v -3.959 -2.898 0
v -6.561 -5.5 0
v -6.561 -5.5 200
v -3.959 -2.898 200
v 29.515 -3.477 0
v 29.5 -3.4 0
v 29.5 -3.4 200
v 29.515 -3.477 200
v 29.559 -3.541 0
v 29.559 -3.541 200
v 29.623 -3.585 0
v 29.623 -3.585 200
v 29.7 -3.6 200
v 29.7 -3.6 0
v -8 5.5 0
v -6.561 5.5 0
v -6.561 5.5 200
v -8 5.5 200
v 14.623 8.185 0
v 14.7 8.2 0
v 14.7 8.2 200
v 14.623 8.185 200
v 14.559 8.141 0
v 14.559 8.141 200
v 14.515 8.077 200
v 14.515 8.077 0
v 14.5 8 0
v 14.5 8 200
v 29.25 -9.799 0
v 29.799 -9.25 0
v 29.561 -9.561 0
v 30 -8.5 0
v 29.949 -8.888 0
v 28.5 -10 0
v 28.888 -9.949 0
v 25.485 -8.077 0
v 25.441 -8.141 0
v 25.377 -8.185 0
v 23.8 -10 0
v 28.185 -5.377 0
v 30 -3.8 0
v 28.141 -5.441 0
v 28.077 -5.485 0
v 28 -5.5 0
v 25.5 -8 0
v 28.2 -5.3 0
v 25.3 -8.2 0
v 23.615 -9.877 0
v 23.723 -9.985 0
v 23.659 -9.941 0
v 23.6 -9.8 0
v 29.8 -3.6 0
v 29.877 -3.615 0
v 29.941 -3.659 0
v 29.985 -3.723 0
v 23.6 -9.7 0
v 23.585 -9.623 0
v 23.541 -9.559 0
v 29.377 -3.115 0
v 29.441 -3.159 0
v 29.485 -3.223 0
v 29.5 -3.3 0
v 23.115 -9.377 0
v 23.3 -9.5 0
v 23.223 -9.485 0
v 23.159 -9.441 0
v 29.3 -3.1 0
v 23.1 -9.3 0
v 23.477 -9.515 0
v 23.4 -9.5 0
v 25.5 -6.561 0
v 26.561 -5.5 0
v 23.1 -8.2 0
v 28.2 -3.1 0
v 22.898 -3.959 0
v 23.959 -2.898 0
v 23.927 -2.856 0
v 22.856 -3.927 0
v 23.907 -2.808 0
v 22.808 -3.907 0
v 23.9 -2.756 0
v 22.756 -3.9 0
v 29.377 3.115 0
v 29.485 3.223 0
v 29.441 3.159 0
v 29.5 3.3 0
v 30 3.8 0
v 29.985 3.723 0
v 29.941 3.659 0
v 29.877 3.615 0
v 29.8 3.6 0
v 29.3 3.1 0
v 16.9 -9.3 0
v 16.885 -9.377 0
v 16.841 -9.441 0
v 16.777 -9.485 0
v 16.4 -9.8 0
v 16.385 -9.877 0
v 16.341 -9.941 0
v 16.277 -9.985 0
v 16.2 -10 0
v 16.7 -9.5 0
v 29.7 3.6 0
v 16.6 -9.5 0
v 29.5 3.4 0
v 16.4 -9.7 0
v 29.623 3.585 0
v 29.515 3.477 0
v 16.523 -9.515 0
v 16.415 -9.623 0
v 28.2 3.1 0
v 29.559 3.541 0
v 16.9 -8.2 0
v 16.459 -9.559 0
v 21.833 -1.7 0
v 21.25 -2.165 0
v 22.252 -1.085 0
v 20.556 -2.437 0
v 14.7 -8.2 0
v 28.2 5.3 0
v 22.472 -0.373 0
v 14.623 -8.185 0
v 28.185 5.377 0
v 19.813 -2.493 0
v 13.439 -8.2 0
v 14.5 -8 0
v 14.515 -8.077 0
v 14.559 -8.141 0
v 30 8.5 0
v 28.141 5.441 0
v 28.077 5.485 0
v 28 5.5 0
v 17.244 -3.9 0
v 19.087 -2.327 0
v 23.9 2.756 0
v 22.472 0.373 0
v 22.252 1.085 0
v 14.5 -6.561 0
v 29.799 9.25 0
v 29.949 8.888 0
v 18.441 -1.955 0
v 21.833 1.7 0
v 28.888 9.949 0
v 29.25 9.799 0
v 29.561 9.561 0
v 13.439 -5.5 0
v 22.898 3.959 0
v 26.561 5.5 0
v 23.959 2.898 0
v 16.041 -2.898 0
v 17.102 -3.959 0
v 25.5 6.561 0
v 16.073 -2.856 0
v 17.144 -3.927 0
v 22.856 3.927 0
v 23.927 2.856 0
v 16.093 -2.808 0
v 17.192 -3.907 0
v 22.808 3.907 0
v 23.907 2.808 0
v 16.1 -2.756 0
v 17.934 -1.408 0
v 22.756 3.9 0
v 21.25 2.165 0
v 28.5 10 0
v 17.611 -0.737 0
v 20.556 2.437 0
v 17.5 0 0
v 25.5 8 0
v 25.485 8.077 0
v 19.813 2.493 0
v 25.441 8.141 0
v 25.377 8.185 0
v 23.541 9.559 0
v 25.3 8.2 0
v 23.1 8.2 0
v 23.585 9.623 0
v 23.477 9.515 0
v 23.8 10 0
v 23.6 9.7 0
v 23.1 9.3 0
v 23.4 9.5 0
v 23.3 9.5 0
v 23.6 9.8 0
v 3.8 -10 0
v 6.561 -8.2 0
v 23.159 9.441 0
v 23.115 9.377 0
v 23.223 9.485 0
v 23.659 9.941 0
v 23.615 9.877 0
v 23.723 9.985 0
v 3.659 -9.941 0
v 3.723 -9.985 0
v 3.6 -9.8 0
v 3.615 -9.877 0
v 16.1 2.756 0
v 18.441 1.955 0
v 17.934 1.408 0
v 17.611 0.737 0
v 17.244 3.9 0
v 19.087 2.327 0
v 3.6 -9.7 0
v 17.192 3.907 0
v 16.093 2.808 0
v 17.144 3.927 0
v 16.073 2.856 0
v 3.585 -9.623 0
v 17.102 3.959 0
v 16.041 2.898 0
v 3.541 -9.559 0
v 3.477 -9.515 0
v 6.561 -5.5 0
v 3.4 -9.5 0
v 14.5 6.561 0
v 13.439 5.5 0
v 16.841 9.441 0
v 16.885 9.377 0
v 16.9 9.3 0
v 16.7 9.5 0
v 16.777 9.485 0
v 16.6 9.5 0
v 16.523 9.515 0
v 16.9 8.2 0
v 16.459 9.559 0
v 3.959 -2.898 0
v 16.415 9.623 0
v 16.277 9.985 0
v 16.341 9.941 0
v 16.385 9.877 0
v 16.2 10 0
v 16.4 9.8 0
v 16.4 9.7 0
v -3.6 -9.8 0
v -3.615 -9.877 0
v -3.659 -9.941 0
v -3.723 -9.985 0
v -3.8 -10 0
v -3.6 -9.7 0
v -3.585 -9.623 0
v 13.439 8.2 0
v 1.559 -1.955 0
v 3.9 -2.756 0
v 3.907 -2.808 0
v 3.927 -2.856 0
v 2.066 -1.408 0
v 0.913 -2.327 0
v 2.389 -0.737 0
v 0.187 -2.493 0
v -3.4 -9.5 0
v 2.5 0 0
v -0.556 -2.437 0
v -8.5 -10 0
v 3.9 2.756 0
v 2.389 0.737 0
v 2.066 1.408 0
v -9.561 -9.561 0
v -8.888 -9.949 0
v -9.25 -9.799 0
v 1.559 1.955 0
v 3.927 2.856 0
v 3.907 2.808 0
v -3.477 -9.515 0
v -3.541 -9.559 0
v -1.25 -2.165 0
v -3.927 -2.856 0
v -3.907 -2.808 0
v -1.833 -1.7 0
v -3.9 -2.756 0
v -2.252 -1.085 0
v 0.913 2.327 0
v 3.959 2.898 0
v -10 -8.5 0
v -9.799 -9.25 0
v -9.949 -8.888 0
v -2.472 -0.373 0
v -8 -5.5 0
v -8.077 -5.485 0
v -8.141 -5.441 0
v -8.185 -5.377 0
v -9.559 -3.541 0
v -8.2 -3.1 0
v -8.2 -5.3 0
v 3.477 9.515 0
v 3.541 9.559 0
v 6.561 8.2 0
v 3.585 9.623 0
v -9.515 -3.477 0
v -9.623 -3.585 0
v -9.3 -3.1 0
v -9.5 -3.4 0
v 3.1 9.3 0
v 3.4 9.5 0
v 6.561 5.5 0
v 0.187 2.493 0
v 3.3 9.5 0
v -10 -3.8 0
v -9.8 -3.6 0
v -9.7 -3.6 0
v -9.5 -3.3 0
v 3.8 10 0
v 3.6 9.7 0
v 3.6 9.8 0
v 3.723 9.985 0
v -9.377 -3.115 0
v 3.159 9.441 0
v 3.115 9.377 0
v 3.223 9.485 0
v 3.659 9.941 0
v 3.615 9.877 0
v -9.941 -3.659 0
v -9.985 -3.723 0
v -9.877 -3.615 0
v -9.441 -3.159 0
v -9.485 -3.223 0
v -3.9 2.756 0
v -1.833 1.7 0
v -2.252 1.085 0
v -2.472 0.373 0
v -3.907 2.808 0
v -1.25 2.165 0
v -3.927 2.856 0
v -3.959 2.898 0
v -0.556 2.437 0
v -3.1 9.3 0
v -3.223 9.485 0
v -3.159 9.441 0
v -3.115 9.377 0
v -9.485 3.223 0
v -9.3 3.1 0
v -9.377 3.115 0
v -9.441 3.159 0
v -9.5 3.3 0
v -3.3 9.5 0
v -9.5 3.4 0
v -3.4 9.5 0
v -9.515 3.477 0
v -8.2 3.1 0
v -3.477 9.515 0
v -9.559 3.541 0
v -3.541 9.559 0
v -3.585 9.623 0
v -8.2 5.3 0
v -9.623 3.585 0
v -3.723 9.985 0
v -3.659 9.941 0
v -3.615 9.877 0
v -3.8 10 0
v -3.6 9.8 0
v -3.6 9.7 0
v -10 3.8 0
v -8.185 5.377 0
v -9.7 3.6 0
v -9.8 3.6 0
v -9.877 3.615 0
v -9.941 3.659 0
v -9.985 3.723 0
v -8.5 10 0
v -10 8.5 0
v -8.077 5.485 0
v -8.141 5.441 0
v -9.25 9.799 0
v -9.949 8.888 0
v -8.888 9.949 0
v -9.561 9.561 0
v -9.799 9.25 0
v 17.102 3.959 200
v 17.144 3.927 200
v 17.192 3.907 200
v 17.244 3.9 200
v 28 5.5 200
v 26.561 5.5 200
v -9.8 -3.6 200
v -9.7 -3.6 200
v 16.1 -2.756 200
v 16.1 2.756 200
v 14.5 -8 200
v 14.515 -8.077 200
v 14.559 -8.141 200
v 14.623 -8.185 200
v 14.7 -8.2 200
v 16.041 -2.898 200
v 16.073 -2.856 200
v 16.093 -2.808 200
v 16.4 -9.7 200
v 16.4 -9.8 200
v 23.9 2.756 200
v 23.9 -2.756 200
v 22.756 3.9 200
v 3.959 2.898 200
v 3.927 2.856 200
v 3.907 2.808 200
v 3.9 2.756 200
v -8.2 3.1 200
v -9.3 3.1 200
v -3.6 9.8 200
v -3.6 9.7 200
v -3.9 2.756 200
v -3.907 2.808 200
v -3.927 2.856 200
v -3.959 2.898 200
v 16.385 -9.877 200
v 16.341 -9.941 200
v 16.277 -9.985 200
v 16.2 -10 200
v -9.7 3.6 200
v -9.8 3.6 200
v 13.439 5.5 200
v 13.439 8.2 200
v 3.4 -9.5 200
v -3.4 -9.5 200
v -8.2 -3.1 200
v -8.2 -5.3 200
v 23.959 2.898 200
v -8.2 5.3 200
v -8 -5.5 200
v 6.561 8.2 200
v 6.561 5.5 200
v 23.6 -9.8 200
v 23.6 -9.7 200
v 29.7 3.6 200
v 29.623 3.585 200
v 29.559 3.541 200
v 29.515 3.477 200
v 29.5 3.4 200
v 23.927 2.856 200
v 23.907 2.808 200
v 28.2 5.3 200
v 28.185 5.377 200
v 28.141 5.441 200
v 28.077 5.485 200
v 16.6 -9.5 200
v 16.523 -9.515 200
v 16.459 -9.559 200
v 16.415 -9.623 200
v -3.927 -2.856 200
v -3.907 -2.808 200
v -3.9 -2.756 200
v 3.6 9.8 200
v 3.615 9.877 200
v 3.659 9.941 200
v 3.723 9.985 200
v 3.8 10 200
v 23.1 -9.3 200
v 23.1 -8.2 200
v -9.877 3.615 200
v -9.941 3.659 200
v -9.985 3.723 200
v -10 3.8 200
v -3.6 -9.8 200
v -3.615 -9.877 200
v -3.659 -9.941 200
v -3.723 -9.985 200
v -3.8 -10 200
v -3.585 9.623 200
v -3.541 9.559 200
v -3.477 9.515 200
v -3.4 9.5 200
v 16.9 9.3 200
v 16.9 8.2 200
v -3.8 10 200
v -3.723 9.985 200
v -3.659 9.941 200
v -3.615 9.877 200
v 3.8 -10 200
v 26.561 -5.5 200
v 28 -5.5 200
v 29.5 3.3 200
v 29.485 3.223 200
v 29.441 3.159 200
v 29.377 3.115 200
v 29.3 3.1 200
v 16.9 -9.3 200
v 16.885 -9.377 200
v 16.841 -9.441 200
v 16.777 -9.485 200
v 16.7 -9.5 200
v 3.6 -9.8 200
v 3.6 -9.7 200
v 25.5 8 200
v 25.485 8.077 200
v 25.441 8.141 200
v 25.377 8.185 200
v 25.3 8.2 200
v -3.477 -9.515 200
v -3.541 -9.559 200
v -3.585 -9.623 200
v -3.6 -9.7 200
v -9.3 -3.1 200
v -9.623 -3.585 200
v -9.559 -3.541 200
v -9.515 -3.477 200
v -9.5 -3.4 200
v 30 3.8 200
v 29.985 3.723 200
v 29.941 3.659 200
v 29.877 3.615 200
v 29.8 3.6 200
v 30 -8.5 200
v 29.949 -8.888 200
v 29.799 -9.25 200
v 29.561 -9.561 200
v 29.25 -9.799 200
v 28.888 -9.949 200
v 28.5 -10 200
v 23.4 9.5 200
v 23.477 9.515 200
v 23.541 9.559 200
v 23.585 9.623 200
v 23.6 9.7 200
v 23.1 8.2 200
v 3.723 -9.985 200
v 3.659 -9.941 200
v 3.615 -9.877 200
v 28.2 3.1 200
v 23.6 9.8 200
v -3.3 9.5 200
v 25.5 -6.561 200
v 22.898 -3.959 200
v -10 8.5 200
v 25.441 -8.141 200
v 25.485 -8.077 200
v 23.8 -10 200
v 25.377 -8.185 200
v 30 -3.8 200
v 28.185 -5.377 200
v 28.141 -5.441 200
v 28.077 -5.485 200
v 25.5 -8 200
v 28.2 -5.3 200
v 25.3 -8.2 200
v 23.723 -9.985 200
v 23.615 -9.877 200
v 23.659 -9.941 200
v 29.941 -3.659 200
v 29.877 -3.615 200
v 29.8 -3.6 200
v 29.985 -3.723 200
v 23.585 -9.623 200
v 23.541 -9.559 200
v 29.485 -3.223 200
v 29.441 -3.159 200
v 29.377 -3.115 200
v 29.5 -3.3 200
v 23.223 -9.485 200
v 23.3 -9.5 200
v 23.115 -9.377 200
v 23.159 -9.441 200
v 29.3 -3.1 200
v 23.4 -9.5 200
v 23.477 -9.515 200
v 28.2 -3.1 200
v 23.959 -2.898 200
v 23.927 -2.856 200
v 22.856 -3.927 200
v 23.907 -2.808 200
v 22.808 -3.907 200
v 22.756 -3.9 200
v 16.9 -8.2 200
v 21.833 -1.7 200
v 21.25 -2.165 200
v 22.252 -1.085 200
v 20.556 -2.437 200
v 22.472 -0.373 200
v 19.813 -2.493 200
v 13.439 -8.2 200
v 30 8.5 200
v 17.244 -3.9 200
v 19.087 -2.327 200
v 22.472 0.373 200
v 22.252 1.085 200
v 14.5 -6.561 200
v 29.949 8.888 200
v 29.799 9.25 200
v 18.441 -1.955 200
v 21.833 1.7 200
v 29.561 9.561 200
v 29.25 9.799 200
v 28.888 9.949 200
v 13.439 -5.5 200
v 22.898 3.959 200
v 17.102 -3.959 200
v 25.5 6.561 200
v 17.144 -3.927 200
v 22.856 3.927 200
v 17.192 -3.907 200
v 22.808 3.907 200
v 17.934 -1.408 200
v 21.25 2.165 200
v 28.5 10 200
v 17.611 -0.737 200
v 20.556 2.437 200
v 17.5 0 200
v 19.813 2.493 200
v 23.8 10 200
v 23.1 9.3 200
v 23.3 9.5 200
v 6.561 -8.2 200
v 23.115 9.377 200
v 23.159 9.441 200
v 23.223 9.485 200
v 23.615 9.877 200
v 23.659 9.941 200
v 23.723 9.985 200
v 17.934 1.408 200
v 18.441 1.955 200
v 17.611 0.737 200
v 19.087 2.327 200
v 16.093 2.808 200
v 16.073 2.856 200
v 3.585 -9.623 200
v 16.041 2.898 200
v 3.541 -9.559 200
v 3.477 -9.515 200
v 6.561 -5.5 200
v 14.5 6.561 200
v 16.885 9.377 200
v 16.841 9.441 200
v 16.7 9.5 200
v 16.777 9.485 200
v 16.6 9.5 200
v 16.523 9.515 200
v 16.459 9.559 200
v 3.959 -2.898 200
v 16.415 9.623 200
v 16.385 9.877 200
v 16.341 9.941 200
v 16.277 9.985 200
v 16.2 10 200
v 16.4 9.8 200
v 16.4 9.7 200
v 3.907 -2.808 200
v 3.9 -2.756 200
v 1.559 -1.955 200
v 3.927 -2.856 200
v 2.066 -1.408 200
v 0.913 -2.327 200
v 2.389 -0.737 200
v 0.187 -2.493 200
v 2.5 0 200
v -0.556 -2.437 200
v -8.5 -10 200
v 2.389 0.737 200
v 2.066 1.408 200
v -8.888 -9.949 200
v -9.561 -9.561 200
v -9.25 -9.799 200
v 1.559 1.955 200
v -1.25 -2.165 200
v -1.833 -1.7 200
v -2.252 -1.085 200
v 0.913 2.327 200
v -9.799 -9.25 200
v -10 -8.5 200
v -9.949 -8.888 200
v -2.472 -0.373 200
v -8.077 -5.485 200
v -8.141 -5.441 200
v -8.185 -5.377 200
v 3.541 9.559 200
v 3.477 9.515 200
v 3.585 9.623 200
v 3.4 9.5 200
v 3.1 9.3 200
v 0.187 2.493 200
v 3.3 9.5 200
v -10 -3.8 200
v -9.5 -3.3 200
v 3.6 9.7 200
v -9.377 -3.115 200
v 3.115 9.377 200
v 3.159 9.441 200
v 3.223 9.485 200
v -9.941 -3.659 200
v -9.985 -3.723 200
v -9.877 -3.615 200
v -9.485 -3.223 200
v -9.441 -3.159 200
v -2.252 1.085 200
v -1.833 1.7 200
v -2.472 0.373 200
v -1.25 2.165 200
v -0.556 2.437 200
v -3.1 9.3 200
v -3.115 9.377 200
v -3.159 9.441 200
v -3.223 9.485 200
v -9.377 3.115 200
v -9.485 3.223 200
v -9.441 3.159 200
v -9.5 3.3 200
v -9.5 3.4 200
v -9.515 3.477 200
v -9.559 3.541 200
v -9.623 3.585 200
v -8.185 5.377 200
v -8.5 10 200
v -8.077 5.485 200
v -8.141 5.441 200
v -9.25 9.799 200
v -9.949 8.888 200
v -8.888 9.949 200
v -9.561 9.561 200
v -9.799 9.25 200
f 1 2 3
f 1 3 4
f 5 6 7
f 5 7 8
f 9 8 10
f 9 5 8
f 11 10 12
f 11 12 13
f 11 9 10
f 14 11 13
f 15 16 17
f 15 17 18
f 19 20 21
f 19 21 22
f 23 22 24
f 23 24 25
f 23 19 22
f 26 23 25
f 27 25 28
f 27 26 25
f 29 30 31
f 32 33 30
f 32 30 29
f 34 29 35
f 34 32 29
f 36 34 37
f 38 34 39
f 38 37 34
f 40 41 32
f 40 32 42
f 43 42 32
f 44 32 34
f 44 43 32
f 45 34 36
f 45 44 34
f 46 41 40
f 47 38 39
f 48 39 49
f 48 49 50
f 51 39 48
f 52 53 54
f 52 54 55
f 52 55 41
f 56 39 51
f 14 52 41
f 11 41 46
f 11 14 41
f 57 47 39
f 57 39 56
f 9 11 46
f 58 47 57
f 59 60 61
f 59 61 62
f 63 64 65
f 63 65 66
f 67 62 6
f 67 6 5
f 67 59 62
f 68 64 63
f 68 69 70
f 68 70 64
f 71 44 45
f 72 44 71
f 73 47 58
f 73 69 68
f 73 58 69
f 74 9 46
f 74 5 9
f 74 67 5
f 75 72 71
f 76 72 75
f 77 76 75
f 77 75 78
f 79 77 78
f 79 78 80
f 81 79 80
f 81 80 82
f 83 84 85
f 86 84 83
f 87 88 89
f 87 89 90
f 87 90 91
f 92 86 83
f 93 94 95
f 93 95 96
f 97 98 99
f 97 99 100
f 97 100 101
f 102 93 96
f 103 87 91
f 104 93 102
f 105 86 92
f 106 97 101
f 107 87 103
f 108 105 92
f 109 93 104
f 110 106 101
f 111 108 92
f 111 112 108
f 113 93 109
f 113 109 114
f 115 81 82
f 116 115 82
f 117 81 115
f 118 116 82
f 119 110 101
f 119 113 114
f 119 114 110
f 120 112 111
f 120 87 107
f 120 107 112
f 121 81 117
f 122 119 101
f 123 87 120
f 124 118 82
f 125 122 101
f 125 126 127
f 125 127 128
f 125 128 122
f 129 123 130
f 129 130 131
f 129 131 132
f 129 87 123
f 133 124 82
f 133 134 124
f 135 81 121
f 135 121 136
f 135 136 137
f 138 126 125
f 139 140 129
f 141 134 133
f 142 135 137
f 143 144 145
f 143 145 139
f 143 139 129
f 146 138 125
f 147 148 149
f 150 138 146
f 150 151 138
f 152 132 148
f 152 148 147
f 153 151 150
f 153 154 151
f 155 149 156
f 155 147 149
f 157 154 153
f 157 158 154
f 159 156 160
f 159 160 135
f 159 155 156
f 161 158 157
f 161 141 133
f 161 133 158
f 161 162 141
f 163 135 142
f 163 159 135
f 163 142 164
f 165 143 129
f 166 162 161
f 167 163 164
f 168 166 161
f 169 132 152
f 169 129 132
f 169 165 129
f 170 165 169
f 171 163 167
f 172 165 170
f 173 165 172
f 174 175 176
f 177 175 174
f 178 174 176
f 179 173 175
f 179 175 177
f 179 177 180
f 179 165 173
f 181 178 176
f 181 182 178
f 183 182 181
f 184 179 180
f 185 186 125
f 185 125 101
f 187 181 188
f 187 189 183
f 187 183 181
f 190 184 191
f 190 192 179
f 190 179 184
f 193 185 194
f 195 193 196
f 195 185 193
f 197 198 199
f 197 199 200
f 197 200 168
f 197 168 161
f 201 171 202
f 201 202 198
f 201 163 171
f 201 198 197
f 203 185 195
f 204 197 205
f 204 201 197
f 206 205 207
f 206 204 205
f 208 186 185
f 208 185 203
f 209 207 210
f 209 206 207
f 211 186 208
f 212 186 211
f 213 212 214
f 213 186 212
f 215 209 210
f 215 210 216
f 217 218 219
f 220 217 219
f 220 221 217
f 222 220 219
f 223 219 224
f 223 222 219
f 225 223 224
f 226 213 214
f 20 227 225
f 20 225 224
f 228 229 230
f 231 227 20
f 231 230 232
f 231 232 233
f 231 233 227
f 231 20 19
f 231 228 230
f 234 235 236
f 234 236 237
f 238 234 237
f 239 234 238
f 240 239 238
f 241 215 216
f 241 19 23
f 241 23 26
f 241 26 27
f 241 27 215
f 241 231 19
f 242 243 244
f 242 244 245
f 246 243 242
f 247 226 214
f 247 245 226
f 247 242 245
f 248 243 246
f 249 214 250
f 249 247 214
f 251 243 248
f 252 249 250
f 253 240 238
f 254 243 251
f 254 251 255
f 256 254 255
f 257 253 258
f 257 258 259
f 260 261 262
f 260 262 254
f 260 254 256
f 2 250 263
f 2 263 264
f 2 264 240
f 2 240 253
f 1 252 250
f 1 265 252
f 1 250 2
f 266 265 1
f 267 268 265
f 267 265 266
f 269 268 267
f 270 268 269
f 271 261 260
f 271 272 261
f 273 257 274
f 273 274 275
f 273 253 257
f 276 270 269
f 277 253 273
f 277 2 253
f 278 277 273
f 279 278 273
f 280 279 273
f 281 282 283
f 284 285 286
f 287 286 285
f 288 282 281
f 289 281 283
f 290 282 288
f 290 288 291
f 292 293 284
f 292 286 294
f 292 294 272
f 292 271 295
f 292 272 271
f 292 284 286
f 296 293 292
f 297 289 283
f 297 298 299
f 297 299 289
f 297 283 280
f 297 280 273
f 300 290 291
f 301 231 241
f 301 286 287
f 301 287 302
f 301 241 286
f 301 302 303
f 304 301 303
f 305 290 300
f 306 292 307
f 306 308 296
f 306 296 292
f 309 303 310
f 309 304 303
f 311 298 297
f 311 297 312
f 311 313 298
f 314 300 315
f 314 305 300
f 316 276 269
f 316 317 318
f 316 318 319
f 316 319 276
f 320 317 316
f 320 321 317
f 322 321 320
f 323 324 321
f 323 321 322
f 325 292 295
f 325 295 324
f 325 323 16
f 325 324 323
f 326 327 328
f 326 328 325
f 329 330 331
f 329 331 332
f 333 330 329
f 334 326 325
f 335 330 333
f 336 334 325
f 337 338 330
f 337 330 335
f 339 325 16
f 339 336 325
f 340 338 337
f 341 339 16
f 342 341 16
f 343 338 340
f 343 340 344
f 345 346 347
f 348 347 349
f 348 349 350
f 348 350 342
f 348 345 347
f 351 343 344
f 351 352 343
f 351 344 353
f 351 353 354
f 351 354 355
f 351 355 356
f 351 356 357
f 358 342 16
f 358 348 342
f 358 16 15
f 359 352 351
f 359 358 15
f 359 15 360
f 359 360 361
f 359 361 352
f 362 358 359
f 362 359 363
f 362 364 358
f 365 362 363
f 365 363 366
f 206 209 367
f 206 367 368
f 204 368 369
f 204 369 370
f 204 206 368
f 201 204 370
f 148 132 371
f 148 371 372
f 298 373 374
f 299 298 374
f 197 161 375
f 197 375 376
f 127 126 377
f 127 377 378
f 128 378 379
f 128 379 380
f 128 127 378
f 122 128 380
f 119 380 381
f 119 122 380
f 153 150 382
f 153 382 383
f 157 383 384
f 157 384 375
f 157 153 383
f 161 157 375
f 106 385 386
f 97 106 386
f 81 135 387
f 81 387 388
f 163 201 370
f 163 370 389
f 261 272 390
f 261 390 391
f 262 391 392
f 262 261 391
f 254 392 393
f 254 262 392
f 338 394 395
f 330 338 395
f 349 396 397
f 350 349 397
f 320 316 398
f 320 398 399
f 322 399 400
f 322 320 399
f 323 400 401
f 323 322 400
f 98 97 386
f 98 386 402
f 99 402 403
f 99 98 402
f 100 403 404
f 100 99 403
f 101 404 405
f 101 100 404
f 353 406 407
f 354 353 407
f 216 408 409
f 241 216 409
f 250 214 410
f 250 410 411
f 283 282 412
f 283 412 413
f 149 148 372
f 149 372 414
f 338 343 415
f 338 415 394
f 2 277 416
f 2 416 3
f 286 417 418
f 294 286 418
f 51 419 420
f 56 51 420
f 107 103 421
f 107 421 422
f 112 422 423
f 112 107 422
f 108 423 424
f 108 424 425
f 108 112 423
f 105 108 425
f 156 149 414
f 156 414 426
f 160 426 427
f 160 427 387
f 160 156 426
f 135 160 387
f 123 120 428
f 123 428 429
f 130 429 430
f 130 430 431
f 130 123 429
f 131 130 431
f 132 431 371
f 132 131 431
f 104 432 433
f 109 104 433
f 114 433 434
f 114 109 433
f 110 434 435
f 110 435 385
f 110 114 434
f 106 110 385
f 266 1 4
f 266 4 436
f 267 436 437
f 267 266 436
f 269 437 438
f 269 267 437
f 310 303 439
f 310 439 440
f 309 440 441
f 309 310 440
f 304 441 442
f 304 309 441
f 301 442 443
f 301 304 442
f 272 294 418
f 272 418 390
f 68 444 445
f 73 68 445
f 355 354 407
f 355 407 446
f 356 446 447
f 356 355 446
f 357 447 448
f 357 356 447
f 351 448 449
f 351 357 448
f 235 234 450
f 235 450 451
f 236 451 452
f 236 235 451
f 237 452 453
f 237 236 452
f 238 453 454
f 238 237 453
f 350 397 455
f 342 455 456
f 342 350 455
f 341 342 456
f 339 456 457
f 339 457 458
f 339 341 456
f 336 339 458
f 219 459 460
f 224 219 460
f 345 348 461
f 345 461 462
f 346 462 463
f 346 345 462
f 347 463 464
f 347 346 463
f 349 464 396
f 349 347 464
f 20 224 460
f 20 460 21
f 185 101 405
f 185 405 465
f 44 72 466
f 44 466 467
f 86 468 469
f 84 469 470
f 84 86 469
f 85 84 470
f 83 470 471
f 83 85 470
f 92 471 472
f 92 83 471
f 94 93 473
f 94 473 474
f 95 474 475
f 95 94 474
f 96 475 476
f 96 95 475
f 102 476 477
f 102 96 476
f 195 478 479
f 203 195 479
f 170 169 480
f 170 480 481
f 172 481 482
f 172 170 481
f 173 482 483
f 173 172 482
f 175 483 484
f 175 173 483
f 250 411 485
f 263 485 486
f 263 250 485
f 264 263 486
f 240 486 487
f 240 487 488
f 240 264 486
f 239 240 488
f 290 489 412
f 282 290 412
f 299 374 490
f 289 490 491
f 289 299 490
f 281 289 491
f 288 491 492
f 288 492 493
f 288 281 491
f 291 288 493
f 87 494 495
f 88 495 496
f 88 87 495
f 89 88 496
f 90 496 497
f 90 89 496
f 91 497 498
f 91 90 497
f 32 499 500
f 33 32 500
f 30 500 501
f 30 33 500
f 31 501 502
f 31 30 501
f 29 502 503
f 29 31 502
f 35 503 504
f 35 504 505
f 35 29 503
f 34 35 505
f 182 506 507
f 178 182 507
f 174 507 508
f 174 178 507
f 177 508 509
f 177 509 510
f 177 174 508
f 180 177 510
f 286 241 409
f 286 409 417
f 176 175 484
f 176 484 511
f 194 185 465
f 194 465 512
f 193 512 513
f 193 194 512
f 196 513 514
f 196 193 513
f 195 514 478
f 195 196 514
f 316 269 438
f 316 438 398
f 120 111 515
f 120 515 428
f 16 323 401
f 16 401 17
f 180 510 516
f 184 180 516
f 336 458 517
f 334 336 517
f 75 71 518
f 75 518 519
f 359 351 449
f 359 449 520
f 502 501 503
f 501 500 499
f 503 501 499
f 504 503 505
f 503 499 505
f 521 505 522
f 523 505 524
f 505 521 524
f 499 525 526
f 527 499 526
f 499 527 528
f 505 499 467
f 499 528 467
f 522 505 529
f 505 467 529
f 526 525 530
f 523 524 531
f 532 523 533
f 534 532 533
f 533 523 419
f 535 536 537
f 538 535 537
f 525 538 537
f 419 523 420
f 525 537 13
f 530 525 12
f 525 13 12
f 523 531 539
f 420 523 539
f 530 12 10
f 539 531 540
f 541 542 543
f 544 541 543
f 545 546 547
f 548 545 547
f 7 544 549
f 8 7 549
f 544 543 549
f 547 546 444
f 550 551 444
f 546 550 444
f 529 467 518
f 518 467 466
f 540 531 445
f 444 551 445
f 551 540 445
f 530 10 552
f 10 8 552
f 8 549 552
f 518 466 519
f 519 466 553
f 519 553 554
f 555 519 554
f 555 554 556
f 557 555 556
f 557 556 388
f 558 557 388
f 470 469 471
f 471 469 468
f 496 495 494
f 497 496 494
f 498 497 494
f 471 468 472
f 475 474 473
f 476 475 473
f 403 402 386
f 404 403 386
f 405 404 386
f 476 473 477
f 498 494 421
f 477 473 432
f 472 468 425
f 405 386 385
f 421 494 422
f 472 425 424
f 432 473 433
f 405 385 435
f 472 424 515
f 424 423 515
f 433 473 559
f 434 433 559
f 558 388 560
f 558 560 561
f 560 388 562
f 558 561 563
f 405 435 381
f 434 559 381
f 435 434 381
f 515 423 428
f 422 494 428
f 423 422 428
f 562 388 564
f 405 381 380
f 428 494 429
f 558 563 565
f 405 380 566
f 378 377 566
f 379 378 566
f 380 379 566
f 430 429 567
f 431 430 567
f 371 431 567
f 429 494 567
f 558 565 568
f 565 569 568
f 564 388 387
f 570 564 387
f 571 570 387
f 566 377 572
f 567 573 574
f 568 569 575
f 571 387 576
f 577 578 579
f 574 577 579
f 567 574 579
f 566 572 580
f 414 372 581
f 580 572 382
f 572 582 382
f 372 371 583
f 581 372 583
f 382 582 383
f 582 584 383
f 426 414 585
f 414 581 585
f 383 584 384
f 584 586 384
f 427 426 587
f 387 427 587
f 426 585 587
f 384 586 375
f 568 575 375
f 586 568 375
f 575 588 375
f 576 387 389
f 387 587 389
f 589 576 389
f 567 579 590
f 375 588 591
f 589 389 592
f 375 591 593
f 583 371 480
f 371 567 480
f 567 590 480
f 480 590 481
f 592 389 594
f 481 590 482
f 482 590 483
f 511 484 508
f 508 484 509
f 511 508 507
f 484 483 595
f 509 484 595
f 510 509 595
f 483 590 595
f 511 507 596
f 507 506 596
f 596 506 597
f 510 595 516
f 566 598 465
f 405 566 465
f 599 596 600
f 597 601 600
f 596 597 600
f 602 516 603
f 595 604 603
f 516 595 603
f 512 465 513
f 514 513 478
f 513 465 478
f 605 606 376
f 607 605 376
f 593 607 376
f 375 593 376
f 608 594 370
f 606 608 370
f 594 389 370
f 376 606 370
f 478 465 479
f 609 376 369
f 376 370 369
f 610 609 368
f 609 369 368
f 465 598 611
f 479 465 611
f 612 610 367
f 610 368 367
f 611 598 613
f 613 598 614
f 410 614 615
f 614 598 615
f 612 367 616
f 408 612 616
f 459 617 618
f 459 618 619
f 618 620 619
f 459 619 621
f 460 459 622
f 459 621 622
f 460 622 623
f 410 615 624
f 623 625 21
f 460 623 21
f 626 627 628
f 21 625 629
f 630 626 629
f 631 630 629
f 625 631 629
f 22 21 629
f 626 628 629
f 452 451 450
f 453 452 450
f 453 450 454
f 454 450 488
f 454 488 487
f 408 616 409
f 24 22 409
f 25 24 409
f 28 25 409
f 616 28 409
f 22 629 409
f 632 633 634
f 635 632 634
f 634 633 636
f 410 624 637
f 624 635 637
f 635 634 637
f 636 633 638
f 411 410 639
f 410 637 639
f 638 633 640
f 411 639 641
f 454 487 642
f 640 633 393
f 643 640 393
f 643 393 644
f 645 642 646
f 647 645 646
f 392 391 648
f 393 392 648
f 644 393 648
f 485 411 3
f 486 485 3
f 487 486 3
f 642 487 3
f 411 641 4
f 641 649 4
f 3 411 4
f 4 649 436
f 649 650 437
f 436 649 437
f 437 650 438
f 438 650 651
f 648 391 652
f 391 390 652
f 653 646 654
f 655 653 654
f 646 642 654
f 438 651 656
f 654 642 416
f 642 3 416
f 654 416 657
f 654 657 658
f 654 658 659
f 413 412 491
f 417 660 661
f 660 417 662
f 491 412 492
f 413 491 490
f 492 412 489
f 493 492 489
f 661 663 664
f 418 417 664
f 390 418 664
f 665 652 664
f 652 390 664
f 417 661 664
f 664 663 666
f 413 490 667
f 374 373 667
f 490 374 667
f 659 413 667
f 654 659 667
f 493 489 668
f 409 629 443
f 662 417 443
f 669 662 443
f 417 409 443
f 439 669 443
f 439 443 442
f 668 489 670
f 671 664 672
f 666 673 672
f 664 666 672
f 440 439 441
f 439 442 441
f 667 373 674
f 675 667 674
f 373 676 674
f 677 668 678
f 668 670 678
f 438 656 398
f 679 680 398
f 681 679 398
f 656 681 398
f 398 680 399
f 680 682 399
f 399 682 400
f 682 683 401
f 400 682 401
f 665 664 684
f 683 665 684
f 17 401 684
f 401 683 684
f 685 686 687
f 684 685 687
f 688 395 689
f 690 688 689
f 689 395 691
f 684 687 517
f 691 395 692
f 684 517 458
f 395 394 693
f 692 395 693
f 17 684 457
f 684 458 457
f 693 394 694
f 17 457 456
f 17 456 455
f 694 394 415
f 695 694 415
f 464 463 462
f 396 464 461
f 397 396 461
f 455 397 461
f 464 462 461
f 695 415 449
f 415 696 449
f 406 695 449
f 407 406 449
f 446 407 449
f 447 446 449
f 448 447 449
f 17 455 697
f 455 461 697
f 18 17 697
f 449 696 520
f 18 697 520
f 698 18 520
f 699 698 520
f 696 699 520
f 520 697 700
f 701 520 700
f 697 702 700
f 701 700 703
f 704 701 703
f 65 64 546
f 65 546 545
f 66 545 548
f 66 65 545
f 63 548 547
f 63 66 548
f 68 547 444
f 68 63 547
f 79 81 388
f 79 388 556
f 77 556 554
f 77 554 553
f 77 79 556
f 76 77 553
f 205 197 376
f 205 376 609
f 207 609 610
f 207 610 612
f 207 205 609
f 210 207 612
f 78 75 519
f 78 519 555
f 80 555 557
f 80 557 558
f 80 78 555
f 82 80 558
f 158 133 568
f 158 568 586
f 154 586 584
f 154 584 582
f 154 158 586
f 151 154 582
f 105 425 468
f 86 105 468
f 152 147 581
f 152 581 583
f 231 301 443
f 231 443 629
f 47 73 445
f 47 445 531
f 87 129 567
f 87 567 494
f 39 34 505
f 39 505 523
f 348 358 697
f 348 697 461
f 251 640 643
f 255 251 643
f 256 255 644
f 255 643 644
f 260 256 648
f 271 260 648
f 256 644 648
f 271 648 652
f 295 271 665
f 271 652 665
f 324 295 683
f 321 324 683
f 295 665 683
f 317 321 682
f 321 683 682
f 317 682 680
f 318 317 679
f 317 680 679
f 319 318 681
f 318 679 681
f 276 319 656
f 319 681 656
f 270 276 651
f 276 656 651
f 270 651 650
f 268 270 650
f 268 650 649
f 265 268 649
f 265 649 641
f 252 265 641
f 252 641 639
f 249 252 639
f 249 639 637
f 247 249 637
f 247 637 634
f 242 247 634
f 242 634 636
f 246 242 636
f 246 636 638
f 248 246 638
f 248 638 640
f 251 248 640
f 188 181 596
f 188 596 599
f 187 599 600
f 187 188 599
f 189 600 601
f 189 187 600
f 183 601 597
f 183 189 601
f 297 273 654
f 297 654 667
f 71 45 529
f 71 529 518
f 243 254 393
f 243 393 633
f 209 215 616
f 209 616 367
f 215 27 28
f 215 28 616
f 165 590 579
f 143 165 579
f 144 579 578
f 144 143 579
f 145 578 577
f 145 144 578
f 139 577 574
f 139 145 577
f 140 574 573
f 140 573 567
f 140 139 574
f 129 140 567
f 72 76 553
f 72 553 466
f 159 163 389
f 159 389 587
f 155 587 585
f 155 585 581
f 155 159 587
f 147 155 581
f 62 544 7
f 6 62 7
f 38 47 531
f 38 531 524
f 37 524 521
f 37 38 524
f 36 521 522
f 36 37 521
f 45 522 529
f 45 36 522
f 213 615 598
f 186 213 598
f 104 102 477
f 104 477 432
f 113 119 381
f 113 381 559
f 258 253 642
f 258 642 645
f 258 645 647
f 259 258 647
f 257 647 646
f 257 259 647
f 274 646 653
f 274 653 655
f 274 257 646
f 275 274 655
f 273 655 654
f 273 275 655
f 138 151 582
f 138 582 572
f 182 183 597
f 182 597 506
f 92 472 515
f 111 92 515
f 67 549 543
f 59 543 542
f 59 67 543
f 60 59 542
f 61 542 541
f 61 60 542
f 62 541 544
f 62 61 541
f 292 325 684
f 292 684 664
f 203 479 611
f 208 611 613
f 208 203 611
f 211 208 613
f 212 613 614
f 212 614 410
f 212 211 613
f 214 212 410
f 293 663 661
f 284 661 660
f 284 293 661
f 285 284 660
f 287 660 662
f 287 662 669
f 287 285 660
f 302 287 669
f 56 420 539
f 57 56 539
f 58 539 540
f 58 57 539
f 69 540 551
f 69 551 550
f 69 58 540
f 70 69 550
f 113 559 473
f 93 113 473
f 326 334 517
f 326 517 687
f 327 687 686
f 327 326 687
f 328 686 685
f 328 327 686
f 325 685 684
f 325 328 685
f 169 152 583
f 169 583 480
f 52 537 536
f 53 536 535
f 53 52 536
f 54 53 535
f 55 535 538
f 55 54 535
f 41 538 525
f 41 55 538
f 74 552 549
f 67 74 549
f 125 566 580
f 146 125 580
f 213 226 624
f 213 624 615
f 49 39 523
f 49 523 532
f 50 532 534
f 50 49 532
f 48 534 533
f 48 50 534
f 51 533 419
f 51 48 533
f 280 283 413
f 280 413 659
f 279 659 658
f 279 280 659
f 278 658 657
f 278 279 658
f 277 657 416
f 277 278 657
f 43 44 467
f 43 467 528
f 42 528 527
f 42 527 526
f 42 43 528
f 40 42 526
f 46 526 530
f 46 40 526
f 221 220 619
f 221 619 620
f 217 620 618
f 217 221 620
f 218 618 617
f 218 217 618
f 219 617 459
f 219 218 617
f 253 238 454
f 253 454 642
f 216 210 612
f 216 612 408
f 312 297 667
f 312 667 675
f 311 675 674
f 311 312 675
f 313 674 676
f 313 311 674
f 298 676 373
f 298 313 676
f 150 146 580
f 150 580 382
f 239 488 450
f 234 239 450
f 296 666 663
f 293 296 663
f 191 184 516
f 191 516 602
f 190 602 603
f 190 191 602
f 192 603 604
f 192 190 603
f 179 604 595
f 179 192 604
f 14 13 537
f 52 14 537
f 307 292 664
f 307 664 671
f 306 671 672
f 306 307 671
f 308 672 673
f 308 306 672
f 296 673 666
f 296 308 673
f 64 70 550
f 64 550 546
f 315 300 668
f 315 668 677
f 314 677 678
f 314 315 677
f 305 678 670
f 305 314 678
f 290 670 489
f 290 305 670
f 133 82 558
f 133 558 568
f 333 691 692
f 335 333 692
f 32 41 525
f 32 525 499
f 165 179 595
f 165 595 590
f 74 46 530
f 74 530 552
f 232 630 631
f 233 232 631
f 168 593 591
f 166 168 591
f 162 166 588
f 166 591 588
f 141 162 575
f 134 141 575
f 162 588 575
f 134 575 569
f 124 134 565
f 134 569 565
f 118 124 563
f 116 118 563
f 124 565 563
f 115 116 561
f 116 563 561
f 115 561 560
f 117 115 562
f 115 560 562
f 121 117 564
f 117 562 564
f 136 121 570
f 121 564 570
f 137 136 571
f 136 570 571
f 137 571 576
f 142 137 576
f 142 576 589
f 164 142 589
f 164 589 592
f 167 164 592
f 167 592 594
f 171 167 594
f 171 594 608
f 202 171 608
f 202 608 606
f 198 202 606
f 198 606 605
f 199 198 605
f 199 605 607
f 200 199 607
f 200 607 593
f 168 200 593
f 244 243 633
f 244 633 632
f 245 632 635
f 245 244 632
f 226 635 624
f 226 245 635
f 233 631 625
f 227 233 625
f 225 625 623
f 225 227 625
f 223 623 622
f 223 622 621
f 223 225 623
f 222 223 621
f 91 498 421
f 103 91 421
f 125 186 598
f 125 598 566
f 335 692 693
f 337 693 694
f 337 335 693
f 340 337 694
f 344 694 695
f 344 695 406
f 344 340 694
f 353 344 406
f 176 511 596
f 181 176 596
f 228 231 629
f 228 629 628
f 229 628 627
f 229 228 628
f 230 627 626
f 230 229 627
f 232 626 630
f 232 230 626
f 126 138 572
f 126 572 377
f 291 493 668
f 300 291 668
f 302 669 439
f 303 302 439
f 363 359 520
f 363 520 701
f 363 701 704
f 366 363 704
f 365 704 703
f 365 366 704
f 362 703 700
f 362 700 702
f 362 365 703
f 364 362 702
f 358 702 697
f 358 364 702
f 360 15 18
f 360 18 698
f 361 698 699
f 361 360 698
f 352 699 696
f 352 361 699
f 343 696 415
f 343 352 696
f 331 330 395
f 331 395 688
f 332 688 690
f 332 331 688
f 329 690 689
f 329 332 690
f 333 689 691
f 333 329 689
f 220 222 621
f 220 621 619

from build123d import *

# Parameters (mm, degrees)
BOSS_EXTRUDE1_DEPTH = 200
SKETCH2_R           = 2.5
CUT_EXTRUDE1_DEPTH  = 203.484567313


with BuildPart() as part:
    # Sketch1 → Boss-Extrude1 (new body)
    with BuildSketch(Plane.XY):
        with BuildLine():
            Line((-8.5, 10), (-3.8, 10))
            ThreePointArc((-3.8, 10), (-3.658578644, 9.941421356), (-3.6, 9.8))
            Line((-3.6, 9.8), (-3.6, 9.7))
            ThreePointArc((-3.6, 9.7), (-3.541421356, 9.558578644), (-3.4, 9.5))
            Line((-3.4, 9.5), (-3.3, 9.5))
            ThreePointArc((-3.3, 9.5), (-3.158578644, 9.441421356), (-3.1, 9.3))
            Line((-3.1, 9.3), (3.1, 9.3))
            ThreePointArc((3.1, 9.3), (3.158578644, 9.441421356), (3.3, 9.5))
            Line((3.3, 9.5), (3.4, 9.5))
            ThreePointArc((3.4, 9.5), (3.541421356, 9.558578644), (3.6, 9.7))
            Line((3.6, 9.7), (3.6, 9.8))
            ThreePointArc((3.6, 9.8), (3.658578644, 9.941421356), (3.8, 10))
            Line((3.8, 10), (8.5, 10))
            Line((8.5, 10), (11.5, 10))
            Line((11.5, 10), (16.2, 10))
            ThreePointArc((16.2, 10), (16.341421356, 9.941421356), (16.4, 9.8))
            Line((16.4, 9.8), (16.4, 9.7))
            ThreePointArc((16.4, 9.7), (16.458578644, 9.558578644), (16.6, 9.5))
            Line((16.6, 9.5), (16.7, 9.5))
            ThreePointArc((16.7, 9.5), (16.841421356, 9.441421356), (16.9, 9.3))
            Line((16.9, 9.3), (16.9, 8.2))
            Line((16.9, 8.2), (14.7, 8.2))
            ThreePointArc((14.7, 8.2), (14.558578644, 8.141421356), (14.5, 8))
            Line((14.5, 8), (14.5, 6.560660172))
            Line((14.5, 6.560660172), (17.102081528, 3.958578644))
            ThreePointArc((17.102081528, 3.958578644), (17.166966198, 3.915224093), (17.243502884, 3.9))
            Line((17.243502884, 3.9), (22.756497116, 3.9))
            ThreePointArc((22.756497116, 3.9), (22.833033802, 3.915224093), (22.897918472, 3.958578644))
            Line((22.897918472, 3.958578644), (25.5, 6.560660172))
            Line((25.5, 6.560660172), (25.5, 8))
            ThreePointArc((25.5, 8), (25.441421356, 8.141421356), (25.3, 8.2))
            Line((25.3, 8.2), (23.1, 8.2))
            Line((23.1, 8.2), (23.1, 9.3))
            ThreePointArc((23.1, 9.3), (23.158578644, 9.441421356), (23.3, 9.5))
            Line((23.3, 9.5), (23.4, 9.5))
            ThreePointArc((23.4, 9.5), (23.541421356, 9.558578644), (23.6, 9.7))
            Line((23.6, 9.7), (23.6, 9.8))
            ThreePointArc((23.6, 9.8), (23.658578644, 9.941421356), (23.8, 10))
            Line((23.8, 10), (28.5, 10))
            ThreePointArc((28.5, 10), (29.560660172, 9.560660172), (30, 8.5))
            Line((30, 8.5), (30, 3.8))
            ThreePointArc((30, 3.8), (29.941421356, 3.658578644), (29.8, 3.6))
            Line((29.8, 3.6), (29.7, 3.6))
            ThreePointArc((29.7, 3.6), (29.558578644, 3.541421356), (29.5, 3.4))
            Line((29.5, 3.4), (29.5, 3.3))
            ThreePointArc((29.5, 3.3), (29.441421356, 3.158578644), (29.3, 3.1))
            Line((29.3, 3.1), (28.2, 3.1))
            Line((28.2, 3.1), (28.2, 5.3))
            ThreePointArc((28.2, 5.3), (28.141421356, 5.441421356), (28, 5.5))
            Line((28, 5.5), (26.560660172, 5.5))
            Line((26.560660172, 5.5), (23.958578644, 2.897918472))
            ThreePointArc((23.958578644, 2.897918472), (23.915224093, 2.833033802), (23.9, 2.756497116))
            Line((23.9, 2.756497116), (23.9, -2.756497116))
            ThreePointArc((23.9, -2.756497116), (23.915224093, -2.833033802), (23.958578644, -2.897918472))
            Line((23.958578644, -2.897918472), (26.560660172, -5.5))
            Line((26.560660172, -5.5), (28, -5.5))
            ThreePointArc((28, -5.5), (28.141421356, -5.441421356), (28.2, -5.3))
            Line((28.2, -5.3), (28.2, -3.1))
            Line((28.2, -3.1), (29.3, -3.1))
            ThreePointArc((29.3, -3.1), (29.441421356, -3.158578644), (29.5, -3.3))
            Line((29.5, -3.3), (29.5, -3.4))
            ThreePointArc((29.5, -3.4), (29.558578644, -3.541421356), (29.7, -3.6))
            Line((29.7, -3.6), (29.8, -3.6))
            ThreePointArc((29.8, -3.6), (29.941421356, -3.658578644), (30, -3.8))
            Line((30, -3.8), (30, -8.5))
            ThreePointArc((30, -8.5), (29.560660172, -9.560660172), (28.5, -10))
            Line((28.5, -10), (23.8, -10))
            ThreePointArc((23.8, -10), (23.658578644, -9.941421356), (23.6, -9.8))
            Line((23.6, -9.8), (23.6, -9.7))
            ThreePointArc((23.6, -9.7), (23.541421356, -9.558578644), (23.4, -9.5))
            Line((23.4, -9.5), (23.3, -9.5))
            ThreePointArc((23.3, -9.5), (23.158578644, -9.441421356), (23.1, -9.3))
            Line((23.1, -9.3), (23.1, -8.2))
            Line((23.1, -8.2), (25.3, -8.2))
            ThreePointArc((25.3, -8.2), (25.441421356, -8.141421356), (25.5, -8))
            Line((25.5, -8), (25.5, -6.560660172))
            Line((25.5, -6.560660172), (22.897918472, -3.958578644))
            ThreePointArc((22.897918472, -3.958578644), (22.833033802, -3.915224093), (22.756497116, -3.9))
            Line((22.756497116, -3.9), (17.243502884, -3.9))
            ThreePointArc((17.243502884, -3.9), (17.166966198, -3.915224093), (17.102081528, -3.958578644))
            Line((17.102081528, -3.958578644), (14.5, -6.560660172))
            Line((14.5, -6.560660172), (14.5, -8))
            ThreePointArc((14.5, -8), (14.558578644, -8.141421356), (14.7, -8.2))
            Line((14.7, -8.2), (16.9, -8.2))
            Line((16.9, -8.2), (16.9, -9.3))
            ThreePointArc((16.9, -9.3), (16.841421356, -9.441421356), (16.7, -9.5))
            Line((16.7, -9.5), (16.6, -9.5))
            ThreePointArc((16.6, -9.5), (16.458578644, -9.558578644), (16.4, -9.7))
            Line((16.4, -9.7), (16.4, -9.8))
            ThreePointArc((16.4, -9.8), (16.341421356, -9.941421356), (16.2, -10))
            Line((16.2, -10), (11.5, -10))
            Line((11.5, -10), (8.5, -10))
            Line((8.5, -10), (3.8, -10))
            ThreePointArc((3.8, -10), (3.658578644, -9.941421356), (3.6, -9.8))
            Line((3.6, -9.8), (3.6, -9.7))
            ThreePointArc((3.6, -9.7), (3.541421356, -9.558578644), (3.4, -9.5))
            Line((3.4, -9.5), (3.3, -9.5))
            Line((3.3, -9.5), (-3.3, -9.5))
            Line((-3.3, -9.5), (-3.4, -9.5))
            ThreePointArc((-3.4, -9.5), (-3.541421356, -9.558578644), (-3.6, -9.7))
            Line((-3.6, -9.7), (-3.6, -9.8))
            ThreePointArc((-3.6, -9.8), (-3.658578644, -9.941421356), (-3.8, -10))
            Line((-3.8, -10), (-8.5, -10))
            ThreePointArc((-8.5, -10), (-9.560660172, -9.560660172), (-10, -8.5))
            Line((-10, -8.5), (-10, -3.8))
            ThreePointArc((-10, -3.8), (-9.941421356, -3.658578644), (-9.8, -3.6))
            Line((-9.8, -3.6), (-9.7, -3.6))
            ThreePointArc((-9.7, -3.6), (-9.558578644, -3.541421356), (-9.5, -3.4))
            Line((-9.5, -3.4), (-9.5, -3.3))
            ThreePointArc((-9.5, -3.3), (-9.441421356, -3.158578644), (-9.3, -3.1))
            Line((-9.3, -3.1), (-8.2, -3.1))
            Line((-8.2, -3.1), (-8.2, -5.3))
            ThreePointArc((-8.2, -5.3), (-8.141421356, -5.441421356), (-8, -5.5))
            Line((-8, -5.5), (-6.560660172, -5.5))
            Line((-6.560660172, -5.5), (-3.958578644, -2.897918472))
            ThreePointArc((-3.958578644, -2.897918472), (-3.915224093, -2.833033802), (-3.9, -2.756497116))
            Line((-3.9, -2.756497116), (-3.9, 2.756497116))
            ThreePointArc((-3.9, 2.756497116), (-3.915224093, 2.833033802), (-3.958578644, 2.897918472))
            Line((-3.958578644, 2.897918472), (-6.560660172, 5.5))
            Line((-6.560660172, 5.5), (-8, 5.5))
            ThreePointArc((-8, 5.5), (-8.141421356, 5.441421356), (-8.2, 5.3))
            Line((-8.2, 5.3), (-8.2, 3.1))
            Line((-8.2, 3.1), (-9.3, 3.1))
            ThreePointArc((-9.3, 3.1), (-9.441421356, 3.158578644), (-9.5, 3.3))
            Line((-9.5, 3.3), (-9.5, 3.4))
            ThreePointArc((-9.5, 3.4), (-9.558578644, 3.541421356), (-9.7, 3.6))
            Line((-9.7, 3.6), (-9.8, 3.6))
            ThreePointArc((-9.8, 3.6), (-9.941421356, 3.658578644), (-10, 3.8))
            Line((-10, 3.8), (-10, 8.5))
            ThreePointArc((-10, 8.5), (-9.560660172, 9.560660172), (-8.5, 10))
        make_face()
        with BuildLine():
            Line((3.9, 2.756497116), (3.9, -2.756497116))
            ThreePointArc((3.9, -2.756497116), (3.915224093, -2.833033802), (3.958578644, -2.897918472))
            Line((3.958578644, -2.897918472), (6.560660172, -5.5))
            Line((6.560660172, -5.5), (6.560660172, -8.2))
            Line((6.560660172, -8.2), (13.439339828, -8.2))
            Line((13.439339828, -8.2), (13.439339828, -5.5))
            Line((13.439339828, -5.5), (16.041421356, -2.897918472))
            ThreePointArc((16.041421356, -2.897918472), (16.084775907, -2.833033802), (16.1, -2.756497116))
            Line((16.1, -2.756497116), (16.1, 2.756497116))
            ThreePointArc((16.1, 2.756497116), (16.084775907, 2.833033802), (16.041421356, 2.897918472))
            Line((16.041421356, 2.897918472), (13.439339828, 5.5))
            Line((13.439339828, 5.5), (13.439339828, 8.2))
            Line((13.439339828, 8.2), (6.560660172, 8.2))
            Line((6.560660172, 8.2), (6.560660172, 5.5))
            Line((6.560660172, 5.5), (3.958578644, 2.897918472))
            ThreePointArc((3.958578644, 2.897918472), (3.915224093, 2.833033802), (3.9, 2.756497116))
        make_face(mode=Mode.SUBTRACT)
    extrude(amount=BOSS_EXTRUDE1_DEPTH)

    # Sketch2 → Cut-Extrude1 (cut, through all)
    with BuildSketch(Plane.XY.offset(200)):
        Circle(SKETCH2_R)
        with Locations(Location((20, 0, 0), (0, 0, 180))):
            Circle(SKETCH2_R)
    extrude(amount=-CUT_EXTRUDE1_DEPTH, mode=Mode.SUBTRACT)


solid = part.part
